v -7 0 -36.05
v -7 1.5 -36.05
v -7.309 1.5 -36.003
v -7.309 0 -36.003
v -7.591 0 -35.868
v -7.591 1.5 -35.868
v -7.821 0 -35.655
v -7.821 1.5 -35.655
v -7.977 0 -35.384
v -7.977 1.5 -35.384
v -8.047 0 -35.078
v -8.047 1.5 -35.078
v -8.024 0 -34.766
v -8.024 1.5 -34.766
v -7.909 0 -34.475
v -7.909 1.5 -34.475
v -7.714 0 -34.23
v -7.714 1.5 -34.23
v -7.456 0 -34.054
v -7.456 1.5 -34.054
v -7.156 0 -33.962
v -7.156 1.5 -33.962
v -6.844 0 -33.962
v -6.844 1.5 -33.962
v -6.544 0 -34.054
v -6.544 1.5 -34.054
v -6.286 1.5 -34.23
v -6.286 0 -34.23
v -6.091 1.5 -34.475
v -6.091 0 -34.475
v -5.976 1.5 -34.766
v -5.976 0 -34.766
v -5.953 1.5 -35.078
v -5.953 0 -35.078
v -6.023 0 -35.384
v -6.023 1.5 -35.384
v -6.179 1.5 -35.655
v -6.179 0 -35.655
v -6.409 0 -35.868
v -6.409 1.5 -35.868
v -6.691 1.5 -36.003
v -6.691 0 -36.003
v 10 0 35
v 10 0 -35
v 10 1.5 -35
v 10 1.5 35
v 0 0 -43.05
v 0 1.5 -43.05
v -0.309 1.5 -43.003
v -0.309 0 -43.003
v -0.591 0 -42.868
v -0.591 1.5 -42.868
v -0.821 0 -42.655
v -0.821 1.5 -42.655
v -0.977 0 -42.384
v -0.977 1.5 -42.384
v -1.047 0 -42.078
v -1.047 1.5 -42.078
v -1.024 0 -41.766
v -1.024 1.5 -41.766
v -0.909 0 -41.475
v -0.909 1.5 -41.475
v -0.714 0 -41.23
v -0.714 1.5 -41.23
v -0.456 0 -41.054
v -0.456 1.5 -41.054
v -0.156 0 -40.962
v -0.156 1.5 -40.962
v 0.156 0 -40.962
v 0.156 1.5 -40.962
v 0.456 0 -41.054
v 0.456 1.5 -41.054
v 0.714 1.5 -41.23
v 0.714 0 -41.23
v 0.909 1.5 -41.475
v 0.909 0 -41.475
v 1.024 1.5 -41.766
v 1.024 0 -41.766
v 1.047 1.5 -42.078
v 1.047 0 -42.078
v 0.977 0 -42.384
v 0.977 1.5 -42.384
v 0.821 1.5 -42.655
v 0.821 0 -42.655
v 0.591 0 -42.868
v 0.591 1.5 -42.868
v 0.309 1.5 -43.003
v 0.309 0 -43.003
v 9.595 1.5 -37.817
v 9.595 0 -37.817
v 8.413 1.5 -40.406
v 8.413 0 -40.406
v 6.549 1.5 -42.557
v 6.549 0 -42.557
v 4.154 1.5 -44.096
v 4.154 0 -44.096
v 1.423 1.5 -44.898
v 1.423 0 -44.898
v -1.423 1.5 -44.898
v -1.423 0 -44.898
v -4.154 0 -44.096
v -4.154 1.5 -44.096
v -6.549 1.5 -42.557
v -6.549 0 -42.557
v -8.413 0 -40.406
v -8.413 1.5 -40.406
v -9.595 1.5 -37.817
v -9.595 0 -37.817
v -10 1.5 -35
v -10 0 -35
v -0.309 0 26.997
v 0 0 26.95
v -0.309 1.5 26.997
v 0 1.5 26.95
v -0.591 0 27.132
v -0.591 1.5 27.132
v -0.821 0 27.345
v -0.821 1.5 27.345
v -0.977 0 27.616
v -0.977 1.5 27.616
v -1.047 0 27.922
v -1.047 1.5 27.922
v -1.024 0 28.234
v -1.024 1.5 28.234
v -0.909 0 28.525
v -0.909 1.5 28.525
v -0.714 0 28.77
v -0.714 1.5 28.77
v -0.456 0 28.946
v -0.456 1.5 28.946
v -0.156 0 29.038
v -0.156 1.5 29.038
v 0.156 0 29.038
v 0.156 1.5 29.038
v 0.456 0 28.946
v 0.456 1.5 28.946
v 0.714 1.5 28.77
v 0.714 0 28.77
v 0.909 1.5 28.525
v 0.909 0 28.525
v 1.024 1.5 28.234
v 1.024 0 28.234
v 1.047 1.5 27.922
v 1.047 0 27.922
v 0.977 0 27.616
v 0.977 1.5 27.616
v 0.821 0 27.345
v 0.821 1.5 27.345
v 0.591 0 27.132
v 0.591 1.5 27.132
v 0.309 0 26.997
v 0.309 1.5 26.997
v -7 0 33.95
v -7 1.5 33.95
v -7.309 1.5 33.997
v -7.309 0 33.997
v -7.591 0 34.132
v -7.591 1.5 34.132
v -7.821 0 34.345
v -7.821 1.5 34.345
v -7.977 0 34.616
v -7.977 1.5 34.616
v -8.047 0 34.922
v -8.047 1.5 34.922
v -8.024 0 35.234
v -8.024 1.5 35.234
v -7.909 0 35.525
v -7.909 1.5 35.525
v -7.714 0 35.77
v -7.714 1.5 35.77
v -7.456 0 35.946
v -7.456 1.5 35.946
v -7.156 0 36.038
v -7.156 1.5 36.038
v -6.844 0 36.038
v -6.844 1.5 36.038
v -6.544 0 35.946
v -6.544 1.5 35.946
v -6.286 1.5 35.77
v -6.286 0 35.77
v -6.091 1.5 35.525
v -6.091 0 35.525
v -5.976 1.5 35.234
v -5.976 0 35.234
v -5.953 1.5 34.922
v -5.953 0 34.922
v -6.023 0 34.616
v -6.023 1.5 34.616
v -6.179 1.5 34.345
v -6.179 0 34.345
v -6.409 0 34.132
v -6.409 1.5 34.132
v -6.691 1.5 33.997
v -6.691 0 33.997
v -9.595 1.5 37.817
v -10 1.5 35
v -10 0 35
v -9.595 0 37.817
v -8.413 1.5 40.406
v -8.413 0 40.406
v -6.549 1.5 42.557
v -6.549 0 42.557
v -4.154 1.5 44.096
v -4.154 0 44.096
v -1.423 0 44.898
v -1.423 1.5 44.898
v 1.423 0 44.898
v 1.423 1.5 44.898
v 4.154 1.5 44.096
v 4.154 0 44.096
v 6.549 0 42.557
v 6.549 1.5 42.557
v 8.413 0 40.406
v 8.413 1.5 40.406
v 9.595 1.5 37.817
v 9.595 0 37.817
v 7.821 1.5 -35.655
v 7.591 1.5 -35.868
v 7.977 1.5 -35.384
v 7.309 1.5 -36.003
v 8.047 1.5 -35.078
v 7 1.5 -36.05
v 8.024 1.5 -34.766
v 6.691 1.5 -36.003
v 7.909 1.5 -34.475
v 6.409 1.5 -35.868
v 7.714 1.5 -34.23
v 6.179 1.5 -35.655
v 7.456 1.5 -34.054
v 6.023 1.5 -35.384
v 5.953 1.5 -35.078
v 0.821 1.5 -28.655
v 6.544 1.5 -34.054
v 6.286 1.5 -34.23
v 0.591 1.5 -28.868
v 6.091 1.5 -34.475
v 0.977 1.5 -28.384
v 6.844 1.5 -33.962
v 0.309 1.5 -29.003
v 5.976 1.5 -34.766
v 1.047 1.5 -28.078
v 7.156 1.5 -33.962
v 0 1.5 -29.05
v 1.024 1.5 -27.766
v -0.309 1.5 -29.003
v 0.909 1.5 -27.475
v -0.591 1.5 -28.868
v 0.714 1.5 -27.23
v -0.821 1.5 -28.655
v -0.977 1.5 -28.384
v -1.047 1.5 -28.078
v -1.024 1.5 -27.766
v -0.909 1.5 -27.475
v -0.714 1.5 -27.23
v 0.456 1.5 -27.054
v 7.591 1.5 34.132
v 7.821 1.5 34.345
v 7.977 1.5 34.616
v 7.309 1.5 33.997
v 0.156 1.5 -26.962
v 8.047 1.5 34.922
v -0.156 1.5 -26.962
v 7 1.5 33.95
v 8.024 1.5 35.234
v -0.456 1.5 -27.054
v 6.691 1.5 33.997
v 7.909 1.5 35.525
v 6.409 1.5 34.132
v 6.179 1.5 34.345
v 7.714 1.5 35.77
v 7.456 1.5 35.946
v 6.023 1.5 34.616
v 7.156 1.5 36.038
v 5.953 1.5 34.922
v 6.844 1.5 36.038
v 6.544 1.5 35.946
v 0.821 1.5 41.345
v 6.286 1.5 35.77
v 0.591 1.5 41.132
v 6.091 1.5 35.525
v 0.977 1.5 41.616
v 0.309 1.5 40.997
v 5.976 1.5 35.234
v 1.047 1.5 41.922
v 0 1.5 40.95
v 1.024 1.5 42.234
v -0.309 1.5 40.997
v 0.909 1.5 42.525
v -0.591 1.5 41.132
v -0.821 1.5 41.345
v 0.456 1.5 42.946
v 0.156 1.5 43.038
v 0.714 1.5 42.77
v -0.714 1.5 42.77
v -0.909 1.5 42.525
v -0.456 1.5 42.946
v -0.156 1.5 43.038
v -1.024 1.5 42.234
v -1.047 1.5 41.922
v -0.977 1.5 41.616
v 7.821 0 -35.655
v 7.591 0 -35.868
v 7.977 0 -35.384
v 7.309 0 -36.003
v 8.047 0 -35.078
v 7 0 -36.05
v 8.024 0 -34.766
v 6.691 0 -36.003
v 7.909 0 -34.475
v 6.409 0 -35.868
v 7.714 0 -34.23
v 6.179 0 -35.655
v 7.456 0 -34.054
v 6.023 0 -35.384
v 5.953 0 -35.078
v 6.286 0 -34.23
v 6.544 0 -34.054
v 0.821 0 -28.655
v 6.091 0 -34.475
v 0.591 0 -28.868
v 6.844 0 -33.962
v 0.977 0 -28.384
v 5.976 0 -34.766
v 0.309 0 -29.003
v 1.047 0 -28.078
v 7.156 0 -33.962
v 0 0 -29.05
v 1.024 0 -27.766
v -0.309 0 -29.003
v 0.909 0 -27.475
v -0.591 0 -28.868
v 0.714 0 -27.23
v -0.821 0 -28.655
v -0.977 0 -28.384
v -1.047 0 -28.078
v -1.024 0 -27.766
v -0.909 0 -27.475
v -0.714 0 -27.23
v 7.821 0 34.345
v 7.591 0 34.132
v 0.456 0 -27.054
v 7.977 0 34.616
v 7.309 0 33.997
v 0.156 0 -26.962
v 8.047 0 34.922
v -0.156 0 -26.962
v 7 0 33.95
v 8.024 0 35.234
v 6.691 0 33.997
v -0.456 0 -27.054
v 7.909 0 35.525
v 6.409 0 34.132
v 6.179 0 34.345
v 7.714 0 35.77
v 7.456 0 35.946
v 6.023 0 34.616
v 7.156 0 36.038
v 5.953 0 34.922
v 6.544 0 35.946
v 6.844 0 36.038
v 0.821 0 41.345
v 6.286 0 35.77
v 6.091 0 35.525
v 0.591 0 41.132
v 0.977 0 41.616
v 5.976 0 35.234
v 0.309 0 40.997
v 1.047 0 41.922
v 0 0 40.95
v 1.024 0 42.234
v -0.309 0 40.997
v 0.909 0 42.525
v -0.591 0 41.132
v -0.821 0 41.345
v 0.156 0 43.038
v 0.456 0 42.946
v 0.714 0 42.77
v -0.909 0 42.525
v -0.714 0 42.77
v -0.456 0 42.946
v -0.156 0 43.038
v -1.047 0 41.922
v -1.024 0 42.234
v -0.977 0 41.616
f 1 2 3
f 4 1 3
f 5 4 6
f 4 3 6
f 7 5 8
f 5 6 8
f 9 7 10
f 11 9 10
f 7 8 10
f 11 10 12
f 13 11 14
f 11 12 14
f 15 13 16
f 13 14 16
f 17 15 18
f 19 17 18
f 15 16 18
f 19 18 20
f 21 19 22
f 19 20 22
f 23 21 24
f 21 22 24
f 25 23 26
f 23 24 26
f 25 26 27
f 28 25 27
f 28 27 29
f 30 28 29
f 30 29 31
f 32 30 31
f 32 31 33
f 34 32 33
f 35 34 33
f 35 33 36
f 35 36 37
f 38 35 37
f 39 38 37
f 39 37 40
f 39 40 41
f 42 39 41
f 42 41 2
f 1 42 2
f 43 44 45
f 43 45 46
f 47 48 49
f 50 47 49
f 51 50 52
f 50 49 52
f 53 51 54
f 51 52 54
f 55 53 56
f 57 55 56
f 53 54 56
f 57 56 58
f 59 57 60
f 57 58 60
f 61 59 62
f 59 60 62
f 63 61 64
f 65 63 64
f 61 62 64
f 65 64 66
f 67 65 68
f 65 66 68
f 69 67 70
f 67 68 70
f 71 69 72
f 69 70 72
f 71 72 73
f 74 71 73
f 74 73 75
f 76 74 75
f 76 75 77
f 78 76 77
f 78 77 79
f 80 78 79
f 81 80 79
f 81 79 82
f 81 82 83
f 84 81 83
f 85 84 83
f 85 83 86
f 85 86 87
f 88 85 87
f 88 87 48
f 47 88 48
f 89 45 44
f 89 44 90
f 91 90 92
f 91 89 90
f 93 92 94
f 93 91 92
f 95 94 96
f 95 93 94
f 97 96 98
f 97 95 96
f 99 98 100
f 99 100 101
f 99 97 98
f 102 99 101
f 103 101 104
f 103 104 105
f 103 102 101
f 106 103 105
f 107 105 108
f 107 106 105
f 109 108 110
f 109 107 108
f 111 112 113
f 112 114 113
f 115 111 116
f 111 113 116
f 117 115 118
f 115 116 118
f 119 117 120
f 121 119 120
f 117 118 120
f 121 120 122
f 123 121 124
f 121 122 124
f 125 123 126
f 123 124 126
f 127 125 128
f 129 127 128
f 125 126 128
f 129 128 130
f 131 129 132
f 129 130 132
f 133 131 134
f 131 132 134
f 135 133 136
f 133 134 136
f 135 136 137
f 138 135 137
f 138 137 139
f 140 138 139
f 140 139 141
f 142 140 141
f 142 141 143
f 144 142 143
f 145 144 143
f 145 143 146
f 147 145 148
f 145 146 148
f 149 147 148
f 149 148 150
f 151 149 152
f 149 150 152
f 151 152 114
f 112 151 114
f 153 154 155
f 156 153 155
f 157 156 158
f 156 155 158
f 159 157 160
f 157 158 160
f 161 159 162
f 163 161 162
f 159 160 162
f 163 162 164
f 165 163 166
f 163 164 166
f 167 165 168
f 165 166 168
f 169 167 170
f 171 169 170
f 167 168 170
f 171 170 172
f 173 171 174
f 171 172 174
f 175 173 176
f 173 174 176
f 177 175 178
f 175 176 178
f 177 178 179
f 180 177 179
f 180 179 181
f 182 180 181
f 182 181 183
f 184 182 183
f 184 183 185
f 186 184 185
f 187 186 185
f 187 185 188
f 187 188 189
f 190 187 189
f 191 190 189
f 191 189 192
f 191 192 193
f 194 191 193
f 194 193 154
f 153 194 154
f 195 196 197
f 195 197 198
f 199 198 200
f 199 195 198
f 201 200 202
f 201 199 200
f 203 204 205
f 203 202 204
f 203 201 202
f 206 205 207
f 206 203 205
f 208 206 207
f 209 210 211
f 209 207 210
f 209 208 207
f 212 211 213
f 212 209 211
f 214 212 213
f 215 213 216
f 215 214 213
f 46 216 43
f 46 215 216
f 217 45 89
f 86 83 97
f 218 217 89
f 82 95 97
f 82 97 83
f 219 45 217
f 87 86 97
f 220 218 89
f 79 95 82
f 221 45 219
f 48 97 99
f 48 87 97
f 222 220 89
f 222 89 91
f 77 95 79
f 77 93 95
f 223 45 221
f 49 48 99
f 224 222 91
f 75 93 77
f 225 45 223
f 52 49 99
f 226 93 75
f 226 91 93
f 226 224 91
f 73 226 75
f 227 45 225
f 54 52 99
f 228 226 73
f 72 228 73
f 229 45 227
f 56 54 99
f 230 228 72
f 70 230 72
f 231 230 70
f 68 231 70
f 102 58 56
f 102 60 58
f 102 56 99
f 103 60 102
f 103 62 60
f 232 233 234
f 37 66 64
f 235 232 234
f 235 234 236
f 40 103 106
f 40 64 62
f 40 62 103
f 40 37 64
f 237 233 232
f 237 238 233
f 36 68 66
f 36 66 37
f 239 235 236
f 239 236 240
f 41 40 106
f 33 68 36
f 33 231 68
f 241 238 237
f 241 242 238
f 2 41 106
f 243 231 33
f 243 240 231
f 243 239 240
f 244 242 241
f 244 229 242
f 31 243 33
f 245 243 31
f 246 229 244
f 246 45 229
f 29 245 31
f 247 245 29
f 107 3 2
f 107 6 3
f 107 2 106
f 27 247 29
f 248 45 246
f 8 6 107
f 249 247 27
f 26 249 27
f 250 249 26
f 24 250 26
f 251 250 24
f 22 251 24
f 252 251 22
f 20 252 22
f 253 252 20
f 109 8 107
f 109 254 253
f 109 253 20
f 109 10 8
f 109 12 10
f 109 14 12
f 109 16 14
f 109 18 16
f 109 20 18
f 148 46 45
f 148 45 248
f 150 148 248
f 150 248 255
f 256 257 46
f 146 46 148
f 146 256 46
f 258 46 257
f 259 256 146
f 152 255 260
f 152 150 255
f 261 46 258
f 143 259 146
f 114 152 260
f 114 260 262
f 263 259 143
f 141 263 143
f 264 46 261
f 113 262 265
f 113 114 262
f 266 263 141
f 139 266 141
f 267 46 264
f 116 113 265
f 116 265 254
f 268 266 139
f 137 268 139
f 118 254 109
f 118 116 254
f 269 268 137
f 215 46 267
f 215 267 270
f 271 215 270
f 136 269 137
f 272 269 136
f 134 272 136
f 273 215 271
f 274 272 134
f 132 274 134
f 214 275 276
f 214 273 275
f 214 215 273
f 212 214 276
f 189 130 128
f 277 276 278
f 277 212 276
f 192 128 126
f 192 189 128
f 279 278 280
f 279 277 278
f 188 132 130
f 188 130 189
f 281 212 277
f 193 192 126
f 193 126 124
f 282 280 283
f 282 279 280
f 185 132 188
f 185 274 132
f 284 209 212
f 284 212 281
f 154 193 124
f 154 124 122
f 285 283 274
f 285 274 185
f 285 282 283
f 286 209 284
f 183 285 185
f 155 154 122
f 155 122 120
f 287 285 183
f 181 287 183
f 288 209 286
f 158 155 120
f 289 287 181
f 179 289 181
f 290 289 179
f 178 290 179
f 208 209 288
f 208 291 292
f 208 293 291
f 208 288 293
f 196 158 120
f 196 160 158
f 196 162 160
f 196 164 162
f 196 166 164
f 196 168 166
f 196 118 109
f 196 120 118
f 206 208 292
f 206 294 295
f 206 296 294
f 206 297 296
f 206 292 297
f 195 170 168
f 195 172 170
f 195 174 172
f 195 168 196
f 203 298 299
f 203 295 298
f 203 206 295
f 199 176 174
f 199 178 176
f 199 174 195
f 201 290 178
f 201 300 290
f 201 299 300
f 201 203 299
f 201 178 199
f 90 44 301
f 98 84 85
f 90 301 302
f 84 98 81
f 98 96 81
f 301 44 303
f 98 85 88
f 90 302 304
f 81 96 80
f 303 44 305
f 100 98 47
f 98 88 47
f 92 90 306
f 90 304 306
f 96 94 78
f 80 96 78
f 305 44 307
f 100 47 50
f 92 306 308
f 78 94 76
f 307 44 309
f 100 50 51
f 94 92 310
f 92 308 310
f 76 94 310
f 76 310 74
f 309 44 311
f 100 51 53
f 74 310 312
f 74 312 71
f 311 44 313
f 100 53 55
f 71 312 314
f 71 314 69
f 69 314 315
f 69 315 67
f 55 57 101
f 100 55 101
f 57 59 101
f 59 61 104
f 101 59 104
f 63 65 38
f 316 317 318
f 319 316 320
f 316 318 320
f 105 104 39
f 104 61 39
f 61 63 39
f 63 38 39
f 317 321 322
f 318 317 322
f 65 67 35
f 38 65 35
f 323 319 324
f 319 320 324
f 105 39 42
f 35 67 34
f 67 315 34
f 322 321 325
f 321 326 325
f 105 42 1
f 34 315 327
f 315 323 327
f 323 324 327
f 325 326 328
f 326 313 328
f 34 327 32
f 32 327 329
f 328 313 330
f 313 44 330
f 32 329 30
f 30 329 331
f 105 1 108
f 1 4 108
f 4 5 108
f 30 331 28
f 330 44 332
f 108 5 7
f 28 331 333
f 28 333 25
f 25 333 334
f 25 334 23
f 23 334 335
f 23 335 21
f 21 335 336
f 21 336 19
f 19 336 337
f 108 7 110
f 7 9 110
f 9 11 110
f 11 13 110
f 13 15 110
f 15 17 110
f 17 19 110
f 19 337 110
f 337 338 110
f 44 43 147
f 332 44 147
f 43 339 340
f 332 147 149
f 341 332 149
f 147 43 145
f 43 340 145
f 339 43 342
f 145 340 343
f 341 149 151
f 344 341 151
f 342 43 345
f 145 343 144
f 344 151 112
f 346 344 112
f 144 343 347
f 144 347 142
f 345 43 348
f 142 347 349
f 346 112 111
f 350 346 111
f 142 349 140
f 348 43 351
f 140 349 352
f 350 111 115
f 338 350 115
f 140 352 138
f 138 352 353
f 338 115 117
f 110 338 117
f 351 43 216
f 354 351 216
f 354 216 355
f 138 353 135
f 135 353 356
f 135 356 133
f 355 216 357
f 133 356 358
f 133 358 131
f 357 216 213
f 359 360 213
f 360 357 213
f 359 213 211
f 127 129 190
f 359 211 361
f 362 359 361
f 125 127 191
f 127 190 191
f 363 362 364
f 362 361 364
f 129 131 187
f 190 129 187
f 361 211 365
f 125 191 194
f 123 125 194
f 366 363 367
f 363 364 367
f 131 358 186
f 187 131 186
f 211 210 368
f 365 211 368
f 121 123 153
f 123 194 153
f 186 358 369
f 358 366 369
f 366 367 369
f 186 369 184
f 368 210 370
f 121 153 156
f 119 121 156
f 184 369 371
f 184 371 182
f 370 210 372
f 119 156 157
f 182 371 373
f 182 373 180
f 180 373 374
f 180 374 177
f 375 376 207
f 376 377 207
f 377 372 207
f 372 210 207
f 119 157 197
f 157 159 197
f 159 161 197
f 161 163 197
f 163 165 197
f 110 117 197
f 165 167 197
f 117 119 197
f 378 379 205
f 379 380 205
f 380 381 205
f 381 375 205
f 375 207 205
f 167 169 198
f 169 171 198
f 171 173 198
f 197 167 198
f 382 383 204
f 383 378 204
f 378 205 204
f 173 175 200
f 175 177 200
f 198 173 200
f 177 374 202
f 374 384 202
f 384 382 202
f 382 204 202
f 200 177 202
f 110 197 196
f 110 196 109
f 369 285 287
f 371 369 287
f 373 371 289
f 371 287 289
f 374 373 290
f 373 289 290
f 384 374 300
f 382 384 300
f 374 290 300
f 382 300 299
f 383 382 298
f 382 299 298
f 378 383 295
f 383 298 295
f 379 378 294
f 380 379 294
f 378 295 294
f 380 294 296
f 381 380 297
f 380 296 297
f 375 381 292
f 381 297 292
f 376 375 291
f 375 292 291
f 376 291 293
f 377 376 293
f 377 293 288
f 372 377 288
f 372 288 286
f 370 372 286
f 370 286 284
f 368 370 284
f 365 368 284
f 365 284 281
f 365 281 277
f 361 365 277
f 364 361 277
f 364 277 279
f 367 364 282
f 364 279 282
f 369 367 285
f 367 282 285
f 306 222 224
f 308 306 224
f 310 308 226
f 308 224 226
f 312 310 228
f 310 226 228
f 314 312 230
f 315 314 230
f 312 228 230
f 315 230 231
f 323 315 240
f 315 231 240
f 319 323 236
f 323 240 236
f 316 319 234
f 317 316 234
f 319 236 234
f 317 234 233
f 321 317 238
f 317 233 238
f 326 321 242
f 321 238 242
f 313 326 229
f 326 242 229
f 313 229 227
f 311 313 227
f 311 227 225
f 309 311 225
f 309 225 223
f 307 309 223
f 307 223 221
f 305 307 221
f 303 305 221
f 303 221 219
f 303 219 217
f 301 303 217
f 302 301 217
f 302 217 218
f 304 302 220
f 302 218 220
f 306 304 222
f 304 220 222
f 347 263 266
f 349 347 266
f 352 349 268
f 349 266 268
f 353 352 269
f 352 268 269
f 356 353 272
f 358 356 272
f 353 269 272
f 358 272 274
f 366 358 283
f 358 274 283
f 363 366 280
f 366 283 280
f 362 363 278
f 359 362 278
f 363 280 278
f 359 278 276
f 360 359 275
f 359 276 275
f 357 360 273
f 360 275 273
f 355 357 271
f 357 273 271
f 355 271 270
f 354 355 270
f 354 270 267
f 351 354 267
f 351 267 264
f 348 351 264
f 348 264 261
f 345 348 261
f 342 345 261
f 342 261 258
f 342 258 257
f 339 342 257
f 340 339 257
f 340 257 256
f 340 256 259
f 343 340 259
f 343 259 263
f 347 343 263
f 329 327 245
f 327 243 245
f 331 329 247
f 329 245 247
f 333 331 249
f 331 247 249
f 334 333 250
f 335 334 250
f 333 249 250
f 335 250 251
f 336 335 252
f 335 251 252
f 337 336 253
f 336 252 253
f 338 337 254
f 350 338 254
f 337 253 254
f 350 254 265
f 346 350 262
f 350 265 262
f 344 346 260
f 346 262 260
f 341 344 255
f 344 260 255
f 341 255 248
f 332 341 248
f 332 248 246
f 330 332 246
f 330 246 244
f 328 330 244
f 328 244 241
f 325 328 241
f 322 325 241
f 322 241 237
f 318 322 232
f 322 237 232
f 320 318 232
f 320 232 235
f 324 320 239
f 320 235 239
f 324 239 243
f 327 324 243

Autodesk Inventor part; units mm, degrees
ref_plane "YZ Plane" through (0, 0, 0) normal (1, 0, 0) x (0, 1, 0)
ref_plane "XZ Plane" through (0, 0, 0) normal (0, 1, 0) x (-1, 0, 0)
ref_plane "XY Plane" through (0, 0, 0) normal (0, 0, 1) x (1, 0, 0)
sketch "Sketch1" plane through (0, 0, 0) normal (0, 1, 0) x (-1, 0, 0)
  line L0 (10, -45) -> (-10, -45)
  line L1 (-10, -45) -> (-10, 45)
  line L2 (-10, 45) -> (10, 45)
  line L3 (10, 45) -> (10, -45)
  point P0 (0, 0)
  dimension "d0" = 20
  dimension "d1" = 90
  dimension "d2" = 45
  dimension "d3" = 10
extrude "Plate1" add sketch "Sketch1" along normal blind 1.5
sketch "Sketch2" plane through (0, 0, 0) normal (0, -1, 0) x (1, 0, 0)
  circle A0 centre (0, 42) radius 0.7835 projected
  circle A1 centre (-7, 35) radius 0.7835 projected
  circle A2 centre (0, 28) radius 0.7835 projected
  circle A3 centre (7, 35) radius 0.7835 projected
  circle A4 centre (0, -28) radius 0.7835 projected
  circle A5 centre (-7, -35) radius 0.7835 projected
  circle A6 centre (0, -42) radius 0.7835 projected
  circle A7 centre (7, -35) radius 0.7835 projected
  point P0 (0, 0)
hole "Hole1" at (0, 0, 42) at (-7, 0, 35) at (0, 0, 28) at (7, 0, 35) at (0, 0, -28) at (-7, 0, -35) at (0, 0, -42) at (7, 0, -35) direction (0, 1, 0) diameter 2.1 depth 1.5
sketch "Sketch3" plane through (0, 1.5, 0) normal (0, 1, 0) x (1, 0, 0)
  arc A0 (10, 35) -> (-10, 35) centre (0, 35) ccw
  arc A1 (-10, -35) -> (10, -35) centre (0, -35) ccw
  line L0 (-10, 35) -> (-10, -35)
  line L1 (10, 35) -> (10, -35)
  line L2 (10, 45) -> (10, -45) projected
  line L3 (-10, 45) -> (10, 45)
  line L4 (10, 45) -> (10, -45)
  line L5 (10, -45) -> (-10, -45)
  line L6 (-10, -45) -> (-10, 45)
  point P0 (0, 0)
  point P1 (0, 45)
  point P2 (10, 35)
  point P3 (-10, -35)
  point P4 (0, -45)
  point P5 (10, -35)
  dimension "d12" = 35
  dimension "d13" = 35
  dimension "d14" = 10
  dimension "d15" = 10
  dimension "d16" = 10
  dimension "d17" = 20
  dimension "d18" = 90
extrude "Extrusion1" cut sketch "Sketch3" against normal blind 10 contours A0 L3 L2 | A0 L6 L3 | L2 L5 A1 | L5 L6 A1
equation "\"d10\" = Thickness"
equation "\"d4\" = Thickness"
equation "\"BendReliefWidth\" = Thickness"
equation "\"BendReliefDepth\" = 0.5 * Thickness"
equation "\"CornerReliefSize\" = 4 * Thickness"
equation "\"MinimumRemnant\" = 2 * Thickness"
equation "\"TransitionRadius\" = BendRadius"
equation "\"JacobiRadiusSize\" = BendRadius"
equation "\"GapSize\" = Thickness"
equation "\"Thickness\" = 1.5"
equation "\"BendRadius\" = 0.31"
properties part number "axis_10_11-connector_frame" material "Aluminum 6061-AHC"
